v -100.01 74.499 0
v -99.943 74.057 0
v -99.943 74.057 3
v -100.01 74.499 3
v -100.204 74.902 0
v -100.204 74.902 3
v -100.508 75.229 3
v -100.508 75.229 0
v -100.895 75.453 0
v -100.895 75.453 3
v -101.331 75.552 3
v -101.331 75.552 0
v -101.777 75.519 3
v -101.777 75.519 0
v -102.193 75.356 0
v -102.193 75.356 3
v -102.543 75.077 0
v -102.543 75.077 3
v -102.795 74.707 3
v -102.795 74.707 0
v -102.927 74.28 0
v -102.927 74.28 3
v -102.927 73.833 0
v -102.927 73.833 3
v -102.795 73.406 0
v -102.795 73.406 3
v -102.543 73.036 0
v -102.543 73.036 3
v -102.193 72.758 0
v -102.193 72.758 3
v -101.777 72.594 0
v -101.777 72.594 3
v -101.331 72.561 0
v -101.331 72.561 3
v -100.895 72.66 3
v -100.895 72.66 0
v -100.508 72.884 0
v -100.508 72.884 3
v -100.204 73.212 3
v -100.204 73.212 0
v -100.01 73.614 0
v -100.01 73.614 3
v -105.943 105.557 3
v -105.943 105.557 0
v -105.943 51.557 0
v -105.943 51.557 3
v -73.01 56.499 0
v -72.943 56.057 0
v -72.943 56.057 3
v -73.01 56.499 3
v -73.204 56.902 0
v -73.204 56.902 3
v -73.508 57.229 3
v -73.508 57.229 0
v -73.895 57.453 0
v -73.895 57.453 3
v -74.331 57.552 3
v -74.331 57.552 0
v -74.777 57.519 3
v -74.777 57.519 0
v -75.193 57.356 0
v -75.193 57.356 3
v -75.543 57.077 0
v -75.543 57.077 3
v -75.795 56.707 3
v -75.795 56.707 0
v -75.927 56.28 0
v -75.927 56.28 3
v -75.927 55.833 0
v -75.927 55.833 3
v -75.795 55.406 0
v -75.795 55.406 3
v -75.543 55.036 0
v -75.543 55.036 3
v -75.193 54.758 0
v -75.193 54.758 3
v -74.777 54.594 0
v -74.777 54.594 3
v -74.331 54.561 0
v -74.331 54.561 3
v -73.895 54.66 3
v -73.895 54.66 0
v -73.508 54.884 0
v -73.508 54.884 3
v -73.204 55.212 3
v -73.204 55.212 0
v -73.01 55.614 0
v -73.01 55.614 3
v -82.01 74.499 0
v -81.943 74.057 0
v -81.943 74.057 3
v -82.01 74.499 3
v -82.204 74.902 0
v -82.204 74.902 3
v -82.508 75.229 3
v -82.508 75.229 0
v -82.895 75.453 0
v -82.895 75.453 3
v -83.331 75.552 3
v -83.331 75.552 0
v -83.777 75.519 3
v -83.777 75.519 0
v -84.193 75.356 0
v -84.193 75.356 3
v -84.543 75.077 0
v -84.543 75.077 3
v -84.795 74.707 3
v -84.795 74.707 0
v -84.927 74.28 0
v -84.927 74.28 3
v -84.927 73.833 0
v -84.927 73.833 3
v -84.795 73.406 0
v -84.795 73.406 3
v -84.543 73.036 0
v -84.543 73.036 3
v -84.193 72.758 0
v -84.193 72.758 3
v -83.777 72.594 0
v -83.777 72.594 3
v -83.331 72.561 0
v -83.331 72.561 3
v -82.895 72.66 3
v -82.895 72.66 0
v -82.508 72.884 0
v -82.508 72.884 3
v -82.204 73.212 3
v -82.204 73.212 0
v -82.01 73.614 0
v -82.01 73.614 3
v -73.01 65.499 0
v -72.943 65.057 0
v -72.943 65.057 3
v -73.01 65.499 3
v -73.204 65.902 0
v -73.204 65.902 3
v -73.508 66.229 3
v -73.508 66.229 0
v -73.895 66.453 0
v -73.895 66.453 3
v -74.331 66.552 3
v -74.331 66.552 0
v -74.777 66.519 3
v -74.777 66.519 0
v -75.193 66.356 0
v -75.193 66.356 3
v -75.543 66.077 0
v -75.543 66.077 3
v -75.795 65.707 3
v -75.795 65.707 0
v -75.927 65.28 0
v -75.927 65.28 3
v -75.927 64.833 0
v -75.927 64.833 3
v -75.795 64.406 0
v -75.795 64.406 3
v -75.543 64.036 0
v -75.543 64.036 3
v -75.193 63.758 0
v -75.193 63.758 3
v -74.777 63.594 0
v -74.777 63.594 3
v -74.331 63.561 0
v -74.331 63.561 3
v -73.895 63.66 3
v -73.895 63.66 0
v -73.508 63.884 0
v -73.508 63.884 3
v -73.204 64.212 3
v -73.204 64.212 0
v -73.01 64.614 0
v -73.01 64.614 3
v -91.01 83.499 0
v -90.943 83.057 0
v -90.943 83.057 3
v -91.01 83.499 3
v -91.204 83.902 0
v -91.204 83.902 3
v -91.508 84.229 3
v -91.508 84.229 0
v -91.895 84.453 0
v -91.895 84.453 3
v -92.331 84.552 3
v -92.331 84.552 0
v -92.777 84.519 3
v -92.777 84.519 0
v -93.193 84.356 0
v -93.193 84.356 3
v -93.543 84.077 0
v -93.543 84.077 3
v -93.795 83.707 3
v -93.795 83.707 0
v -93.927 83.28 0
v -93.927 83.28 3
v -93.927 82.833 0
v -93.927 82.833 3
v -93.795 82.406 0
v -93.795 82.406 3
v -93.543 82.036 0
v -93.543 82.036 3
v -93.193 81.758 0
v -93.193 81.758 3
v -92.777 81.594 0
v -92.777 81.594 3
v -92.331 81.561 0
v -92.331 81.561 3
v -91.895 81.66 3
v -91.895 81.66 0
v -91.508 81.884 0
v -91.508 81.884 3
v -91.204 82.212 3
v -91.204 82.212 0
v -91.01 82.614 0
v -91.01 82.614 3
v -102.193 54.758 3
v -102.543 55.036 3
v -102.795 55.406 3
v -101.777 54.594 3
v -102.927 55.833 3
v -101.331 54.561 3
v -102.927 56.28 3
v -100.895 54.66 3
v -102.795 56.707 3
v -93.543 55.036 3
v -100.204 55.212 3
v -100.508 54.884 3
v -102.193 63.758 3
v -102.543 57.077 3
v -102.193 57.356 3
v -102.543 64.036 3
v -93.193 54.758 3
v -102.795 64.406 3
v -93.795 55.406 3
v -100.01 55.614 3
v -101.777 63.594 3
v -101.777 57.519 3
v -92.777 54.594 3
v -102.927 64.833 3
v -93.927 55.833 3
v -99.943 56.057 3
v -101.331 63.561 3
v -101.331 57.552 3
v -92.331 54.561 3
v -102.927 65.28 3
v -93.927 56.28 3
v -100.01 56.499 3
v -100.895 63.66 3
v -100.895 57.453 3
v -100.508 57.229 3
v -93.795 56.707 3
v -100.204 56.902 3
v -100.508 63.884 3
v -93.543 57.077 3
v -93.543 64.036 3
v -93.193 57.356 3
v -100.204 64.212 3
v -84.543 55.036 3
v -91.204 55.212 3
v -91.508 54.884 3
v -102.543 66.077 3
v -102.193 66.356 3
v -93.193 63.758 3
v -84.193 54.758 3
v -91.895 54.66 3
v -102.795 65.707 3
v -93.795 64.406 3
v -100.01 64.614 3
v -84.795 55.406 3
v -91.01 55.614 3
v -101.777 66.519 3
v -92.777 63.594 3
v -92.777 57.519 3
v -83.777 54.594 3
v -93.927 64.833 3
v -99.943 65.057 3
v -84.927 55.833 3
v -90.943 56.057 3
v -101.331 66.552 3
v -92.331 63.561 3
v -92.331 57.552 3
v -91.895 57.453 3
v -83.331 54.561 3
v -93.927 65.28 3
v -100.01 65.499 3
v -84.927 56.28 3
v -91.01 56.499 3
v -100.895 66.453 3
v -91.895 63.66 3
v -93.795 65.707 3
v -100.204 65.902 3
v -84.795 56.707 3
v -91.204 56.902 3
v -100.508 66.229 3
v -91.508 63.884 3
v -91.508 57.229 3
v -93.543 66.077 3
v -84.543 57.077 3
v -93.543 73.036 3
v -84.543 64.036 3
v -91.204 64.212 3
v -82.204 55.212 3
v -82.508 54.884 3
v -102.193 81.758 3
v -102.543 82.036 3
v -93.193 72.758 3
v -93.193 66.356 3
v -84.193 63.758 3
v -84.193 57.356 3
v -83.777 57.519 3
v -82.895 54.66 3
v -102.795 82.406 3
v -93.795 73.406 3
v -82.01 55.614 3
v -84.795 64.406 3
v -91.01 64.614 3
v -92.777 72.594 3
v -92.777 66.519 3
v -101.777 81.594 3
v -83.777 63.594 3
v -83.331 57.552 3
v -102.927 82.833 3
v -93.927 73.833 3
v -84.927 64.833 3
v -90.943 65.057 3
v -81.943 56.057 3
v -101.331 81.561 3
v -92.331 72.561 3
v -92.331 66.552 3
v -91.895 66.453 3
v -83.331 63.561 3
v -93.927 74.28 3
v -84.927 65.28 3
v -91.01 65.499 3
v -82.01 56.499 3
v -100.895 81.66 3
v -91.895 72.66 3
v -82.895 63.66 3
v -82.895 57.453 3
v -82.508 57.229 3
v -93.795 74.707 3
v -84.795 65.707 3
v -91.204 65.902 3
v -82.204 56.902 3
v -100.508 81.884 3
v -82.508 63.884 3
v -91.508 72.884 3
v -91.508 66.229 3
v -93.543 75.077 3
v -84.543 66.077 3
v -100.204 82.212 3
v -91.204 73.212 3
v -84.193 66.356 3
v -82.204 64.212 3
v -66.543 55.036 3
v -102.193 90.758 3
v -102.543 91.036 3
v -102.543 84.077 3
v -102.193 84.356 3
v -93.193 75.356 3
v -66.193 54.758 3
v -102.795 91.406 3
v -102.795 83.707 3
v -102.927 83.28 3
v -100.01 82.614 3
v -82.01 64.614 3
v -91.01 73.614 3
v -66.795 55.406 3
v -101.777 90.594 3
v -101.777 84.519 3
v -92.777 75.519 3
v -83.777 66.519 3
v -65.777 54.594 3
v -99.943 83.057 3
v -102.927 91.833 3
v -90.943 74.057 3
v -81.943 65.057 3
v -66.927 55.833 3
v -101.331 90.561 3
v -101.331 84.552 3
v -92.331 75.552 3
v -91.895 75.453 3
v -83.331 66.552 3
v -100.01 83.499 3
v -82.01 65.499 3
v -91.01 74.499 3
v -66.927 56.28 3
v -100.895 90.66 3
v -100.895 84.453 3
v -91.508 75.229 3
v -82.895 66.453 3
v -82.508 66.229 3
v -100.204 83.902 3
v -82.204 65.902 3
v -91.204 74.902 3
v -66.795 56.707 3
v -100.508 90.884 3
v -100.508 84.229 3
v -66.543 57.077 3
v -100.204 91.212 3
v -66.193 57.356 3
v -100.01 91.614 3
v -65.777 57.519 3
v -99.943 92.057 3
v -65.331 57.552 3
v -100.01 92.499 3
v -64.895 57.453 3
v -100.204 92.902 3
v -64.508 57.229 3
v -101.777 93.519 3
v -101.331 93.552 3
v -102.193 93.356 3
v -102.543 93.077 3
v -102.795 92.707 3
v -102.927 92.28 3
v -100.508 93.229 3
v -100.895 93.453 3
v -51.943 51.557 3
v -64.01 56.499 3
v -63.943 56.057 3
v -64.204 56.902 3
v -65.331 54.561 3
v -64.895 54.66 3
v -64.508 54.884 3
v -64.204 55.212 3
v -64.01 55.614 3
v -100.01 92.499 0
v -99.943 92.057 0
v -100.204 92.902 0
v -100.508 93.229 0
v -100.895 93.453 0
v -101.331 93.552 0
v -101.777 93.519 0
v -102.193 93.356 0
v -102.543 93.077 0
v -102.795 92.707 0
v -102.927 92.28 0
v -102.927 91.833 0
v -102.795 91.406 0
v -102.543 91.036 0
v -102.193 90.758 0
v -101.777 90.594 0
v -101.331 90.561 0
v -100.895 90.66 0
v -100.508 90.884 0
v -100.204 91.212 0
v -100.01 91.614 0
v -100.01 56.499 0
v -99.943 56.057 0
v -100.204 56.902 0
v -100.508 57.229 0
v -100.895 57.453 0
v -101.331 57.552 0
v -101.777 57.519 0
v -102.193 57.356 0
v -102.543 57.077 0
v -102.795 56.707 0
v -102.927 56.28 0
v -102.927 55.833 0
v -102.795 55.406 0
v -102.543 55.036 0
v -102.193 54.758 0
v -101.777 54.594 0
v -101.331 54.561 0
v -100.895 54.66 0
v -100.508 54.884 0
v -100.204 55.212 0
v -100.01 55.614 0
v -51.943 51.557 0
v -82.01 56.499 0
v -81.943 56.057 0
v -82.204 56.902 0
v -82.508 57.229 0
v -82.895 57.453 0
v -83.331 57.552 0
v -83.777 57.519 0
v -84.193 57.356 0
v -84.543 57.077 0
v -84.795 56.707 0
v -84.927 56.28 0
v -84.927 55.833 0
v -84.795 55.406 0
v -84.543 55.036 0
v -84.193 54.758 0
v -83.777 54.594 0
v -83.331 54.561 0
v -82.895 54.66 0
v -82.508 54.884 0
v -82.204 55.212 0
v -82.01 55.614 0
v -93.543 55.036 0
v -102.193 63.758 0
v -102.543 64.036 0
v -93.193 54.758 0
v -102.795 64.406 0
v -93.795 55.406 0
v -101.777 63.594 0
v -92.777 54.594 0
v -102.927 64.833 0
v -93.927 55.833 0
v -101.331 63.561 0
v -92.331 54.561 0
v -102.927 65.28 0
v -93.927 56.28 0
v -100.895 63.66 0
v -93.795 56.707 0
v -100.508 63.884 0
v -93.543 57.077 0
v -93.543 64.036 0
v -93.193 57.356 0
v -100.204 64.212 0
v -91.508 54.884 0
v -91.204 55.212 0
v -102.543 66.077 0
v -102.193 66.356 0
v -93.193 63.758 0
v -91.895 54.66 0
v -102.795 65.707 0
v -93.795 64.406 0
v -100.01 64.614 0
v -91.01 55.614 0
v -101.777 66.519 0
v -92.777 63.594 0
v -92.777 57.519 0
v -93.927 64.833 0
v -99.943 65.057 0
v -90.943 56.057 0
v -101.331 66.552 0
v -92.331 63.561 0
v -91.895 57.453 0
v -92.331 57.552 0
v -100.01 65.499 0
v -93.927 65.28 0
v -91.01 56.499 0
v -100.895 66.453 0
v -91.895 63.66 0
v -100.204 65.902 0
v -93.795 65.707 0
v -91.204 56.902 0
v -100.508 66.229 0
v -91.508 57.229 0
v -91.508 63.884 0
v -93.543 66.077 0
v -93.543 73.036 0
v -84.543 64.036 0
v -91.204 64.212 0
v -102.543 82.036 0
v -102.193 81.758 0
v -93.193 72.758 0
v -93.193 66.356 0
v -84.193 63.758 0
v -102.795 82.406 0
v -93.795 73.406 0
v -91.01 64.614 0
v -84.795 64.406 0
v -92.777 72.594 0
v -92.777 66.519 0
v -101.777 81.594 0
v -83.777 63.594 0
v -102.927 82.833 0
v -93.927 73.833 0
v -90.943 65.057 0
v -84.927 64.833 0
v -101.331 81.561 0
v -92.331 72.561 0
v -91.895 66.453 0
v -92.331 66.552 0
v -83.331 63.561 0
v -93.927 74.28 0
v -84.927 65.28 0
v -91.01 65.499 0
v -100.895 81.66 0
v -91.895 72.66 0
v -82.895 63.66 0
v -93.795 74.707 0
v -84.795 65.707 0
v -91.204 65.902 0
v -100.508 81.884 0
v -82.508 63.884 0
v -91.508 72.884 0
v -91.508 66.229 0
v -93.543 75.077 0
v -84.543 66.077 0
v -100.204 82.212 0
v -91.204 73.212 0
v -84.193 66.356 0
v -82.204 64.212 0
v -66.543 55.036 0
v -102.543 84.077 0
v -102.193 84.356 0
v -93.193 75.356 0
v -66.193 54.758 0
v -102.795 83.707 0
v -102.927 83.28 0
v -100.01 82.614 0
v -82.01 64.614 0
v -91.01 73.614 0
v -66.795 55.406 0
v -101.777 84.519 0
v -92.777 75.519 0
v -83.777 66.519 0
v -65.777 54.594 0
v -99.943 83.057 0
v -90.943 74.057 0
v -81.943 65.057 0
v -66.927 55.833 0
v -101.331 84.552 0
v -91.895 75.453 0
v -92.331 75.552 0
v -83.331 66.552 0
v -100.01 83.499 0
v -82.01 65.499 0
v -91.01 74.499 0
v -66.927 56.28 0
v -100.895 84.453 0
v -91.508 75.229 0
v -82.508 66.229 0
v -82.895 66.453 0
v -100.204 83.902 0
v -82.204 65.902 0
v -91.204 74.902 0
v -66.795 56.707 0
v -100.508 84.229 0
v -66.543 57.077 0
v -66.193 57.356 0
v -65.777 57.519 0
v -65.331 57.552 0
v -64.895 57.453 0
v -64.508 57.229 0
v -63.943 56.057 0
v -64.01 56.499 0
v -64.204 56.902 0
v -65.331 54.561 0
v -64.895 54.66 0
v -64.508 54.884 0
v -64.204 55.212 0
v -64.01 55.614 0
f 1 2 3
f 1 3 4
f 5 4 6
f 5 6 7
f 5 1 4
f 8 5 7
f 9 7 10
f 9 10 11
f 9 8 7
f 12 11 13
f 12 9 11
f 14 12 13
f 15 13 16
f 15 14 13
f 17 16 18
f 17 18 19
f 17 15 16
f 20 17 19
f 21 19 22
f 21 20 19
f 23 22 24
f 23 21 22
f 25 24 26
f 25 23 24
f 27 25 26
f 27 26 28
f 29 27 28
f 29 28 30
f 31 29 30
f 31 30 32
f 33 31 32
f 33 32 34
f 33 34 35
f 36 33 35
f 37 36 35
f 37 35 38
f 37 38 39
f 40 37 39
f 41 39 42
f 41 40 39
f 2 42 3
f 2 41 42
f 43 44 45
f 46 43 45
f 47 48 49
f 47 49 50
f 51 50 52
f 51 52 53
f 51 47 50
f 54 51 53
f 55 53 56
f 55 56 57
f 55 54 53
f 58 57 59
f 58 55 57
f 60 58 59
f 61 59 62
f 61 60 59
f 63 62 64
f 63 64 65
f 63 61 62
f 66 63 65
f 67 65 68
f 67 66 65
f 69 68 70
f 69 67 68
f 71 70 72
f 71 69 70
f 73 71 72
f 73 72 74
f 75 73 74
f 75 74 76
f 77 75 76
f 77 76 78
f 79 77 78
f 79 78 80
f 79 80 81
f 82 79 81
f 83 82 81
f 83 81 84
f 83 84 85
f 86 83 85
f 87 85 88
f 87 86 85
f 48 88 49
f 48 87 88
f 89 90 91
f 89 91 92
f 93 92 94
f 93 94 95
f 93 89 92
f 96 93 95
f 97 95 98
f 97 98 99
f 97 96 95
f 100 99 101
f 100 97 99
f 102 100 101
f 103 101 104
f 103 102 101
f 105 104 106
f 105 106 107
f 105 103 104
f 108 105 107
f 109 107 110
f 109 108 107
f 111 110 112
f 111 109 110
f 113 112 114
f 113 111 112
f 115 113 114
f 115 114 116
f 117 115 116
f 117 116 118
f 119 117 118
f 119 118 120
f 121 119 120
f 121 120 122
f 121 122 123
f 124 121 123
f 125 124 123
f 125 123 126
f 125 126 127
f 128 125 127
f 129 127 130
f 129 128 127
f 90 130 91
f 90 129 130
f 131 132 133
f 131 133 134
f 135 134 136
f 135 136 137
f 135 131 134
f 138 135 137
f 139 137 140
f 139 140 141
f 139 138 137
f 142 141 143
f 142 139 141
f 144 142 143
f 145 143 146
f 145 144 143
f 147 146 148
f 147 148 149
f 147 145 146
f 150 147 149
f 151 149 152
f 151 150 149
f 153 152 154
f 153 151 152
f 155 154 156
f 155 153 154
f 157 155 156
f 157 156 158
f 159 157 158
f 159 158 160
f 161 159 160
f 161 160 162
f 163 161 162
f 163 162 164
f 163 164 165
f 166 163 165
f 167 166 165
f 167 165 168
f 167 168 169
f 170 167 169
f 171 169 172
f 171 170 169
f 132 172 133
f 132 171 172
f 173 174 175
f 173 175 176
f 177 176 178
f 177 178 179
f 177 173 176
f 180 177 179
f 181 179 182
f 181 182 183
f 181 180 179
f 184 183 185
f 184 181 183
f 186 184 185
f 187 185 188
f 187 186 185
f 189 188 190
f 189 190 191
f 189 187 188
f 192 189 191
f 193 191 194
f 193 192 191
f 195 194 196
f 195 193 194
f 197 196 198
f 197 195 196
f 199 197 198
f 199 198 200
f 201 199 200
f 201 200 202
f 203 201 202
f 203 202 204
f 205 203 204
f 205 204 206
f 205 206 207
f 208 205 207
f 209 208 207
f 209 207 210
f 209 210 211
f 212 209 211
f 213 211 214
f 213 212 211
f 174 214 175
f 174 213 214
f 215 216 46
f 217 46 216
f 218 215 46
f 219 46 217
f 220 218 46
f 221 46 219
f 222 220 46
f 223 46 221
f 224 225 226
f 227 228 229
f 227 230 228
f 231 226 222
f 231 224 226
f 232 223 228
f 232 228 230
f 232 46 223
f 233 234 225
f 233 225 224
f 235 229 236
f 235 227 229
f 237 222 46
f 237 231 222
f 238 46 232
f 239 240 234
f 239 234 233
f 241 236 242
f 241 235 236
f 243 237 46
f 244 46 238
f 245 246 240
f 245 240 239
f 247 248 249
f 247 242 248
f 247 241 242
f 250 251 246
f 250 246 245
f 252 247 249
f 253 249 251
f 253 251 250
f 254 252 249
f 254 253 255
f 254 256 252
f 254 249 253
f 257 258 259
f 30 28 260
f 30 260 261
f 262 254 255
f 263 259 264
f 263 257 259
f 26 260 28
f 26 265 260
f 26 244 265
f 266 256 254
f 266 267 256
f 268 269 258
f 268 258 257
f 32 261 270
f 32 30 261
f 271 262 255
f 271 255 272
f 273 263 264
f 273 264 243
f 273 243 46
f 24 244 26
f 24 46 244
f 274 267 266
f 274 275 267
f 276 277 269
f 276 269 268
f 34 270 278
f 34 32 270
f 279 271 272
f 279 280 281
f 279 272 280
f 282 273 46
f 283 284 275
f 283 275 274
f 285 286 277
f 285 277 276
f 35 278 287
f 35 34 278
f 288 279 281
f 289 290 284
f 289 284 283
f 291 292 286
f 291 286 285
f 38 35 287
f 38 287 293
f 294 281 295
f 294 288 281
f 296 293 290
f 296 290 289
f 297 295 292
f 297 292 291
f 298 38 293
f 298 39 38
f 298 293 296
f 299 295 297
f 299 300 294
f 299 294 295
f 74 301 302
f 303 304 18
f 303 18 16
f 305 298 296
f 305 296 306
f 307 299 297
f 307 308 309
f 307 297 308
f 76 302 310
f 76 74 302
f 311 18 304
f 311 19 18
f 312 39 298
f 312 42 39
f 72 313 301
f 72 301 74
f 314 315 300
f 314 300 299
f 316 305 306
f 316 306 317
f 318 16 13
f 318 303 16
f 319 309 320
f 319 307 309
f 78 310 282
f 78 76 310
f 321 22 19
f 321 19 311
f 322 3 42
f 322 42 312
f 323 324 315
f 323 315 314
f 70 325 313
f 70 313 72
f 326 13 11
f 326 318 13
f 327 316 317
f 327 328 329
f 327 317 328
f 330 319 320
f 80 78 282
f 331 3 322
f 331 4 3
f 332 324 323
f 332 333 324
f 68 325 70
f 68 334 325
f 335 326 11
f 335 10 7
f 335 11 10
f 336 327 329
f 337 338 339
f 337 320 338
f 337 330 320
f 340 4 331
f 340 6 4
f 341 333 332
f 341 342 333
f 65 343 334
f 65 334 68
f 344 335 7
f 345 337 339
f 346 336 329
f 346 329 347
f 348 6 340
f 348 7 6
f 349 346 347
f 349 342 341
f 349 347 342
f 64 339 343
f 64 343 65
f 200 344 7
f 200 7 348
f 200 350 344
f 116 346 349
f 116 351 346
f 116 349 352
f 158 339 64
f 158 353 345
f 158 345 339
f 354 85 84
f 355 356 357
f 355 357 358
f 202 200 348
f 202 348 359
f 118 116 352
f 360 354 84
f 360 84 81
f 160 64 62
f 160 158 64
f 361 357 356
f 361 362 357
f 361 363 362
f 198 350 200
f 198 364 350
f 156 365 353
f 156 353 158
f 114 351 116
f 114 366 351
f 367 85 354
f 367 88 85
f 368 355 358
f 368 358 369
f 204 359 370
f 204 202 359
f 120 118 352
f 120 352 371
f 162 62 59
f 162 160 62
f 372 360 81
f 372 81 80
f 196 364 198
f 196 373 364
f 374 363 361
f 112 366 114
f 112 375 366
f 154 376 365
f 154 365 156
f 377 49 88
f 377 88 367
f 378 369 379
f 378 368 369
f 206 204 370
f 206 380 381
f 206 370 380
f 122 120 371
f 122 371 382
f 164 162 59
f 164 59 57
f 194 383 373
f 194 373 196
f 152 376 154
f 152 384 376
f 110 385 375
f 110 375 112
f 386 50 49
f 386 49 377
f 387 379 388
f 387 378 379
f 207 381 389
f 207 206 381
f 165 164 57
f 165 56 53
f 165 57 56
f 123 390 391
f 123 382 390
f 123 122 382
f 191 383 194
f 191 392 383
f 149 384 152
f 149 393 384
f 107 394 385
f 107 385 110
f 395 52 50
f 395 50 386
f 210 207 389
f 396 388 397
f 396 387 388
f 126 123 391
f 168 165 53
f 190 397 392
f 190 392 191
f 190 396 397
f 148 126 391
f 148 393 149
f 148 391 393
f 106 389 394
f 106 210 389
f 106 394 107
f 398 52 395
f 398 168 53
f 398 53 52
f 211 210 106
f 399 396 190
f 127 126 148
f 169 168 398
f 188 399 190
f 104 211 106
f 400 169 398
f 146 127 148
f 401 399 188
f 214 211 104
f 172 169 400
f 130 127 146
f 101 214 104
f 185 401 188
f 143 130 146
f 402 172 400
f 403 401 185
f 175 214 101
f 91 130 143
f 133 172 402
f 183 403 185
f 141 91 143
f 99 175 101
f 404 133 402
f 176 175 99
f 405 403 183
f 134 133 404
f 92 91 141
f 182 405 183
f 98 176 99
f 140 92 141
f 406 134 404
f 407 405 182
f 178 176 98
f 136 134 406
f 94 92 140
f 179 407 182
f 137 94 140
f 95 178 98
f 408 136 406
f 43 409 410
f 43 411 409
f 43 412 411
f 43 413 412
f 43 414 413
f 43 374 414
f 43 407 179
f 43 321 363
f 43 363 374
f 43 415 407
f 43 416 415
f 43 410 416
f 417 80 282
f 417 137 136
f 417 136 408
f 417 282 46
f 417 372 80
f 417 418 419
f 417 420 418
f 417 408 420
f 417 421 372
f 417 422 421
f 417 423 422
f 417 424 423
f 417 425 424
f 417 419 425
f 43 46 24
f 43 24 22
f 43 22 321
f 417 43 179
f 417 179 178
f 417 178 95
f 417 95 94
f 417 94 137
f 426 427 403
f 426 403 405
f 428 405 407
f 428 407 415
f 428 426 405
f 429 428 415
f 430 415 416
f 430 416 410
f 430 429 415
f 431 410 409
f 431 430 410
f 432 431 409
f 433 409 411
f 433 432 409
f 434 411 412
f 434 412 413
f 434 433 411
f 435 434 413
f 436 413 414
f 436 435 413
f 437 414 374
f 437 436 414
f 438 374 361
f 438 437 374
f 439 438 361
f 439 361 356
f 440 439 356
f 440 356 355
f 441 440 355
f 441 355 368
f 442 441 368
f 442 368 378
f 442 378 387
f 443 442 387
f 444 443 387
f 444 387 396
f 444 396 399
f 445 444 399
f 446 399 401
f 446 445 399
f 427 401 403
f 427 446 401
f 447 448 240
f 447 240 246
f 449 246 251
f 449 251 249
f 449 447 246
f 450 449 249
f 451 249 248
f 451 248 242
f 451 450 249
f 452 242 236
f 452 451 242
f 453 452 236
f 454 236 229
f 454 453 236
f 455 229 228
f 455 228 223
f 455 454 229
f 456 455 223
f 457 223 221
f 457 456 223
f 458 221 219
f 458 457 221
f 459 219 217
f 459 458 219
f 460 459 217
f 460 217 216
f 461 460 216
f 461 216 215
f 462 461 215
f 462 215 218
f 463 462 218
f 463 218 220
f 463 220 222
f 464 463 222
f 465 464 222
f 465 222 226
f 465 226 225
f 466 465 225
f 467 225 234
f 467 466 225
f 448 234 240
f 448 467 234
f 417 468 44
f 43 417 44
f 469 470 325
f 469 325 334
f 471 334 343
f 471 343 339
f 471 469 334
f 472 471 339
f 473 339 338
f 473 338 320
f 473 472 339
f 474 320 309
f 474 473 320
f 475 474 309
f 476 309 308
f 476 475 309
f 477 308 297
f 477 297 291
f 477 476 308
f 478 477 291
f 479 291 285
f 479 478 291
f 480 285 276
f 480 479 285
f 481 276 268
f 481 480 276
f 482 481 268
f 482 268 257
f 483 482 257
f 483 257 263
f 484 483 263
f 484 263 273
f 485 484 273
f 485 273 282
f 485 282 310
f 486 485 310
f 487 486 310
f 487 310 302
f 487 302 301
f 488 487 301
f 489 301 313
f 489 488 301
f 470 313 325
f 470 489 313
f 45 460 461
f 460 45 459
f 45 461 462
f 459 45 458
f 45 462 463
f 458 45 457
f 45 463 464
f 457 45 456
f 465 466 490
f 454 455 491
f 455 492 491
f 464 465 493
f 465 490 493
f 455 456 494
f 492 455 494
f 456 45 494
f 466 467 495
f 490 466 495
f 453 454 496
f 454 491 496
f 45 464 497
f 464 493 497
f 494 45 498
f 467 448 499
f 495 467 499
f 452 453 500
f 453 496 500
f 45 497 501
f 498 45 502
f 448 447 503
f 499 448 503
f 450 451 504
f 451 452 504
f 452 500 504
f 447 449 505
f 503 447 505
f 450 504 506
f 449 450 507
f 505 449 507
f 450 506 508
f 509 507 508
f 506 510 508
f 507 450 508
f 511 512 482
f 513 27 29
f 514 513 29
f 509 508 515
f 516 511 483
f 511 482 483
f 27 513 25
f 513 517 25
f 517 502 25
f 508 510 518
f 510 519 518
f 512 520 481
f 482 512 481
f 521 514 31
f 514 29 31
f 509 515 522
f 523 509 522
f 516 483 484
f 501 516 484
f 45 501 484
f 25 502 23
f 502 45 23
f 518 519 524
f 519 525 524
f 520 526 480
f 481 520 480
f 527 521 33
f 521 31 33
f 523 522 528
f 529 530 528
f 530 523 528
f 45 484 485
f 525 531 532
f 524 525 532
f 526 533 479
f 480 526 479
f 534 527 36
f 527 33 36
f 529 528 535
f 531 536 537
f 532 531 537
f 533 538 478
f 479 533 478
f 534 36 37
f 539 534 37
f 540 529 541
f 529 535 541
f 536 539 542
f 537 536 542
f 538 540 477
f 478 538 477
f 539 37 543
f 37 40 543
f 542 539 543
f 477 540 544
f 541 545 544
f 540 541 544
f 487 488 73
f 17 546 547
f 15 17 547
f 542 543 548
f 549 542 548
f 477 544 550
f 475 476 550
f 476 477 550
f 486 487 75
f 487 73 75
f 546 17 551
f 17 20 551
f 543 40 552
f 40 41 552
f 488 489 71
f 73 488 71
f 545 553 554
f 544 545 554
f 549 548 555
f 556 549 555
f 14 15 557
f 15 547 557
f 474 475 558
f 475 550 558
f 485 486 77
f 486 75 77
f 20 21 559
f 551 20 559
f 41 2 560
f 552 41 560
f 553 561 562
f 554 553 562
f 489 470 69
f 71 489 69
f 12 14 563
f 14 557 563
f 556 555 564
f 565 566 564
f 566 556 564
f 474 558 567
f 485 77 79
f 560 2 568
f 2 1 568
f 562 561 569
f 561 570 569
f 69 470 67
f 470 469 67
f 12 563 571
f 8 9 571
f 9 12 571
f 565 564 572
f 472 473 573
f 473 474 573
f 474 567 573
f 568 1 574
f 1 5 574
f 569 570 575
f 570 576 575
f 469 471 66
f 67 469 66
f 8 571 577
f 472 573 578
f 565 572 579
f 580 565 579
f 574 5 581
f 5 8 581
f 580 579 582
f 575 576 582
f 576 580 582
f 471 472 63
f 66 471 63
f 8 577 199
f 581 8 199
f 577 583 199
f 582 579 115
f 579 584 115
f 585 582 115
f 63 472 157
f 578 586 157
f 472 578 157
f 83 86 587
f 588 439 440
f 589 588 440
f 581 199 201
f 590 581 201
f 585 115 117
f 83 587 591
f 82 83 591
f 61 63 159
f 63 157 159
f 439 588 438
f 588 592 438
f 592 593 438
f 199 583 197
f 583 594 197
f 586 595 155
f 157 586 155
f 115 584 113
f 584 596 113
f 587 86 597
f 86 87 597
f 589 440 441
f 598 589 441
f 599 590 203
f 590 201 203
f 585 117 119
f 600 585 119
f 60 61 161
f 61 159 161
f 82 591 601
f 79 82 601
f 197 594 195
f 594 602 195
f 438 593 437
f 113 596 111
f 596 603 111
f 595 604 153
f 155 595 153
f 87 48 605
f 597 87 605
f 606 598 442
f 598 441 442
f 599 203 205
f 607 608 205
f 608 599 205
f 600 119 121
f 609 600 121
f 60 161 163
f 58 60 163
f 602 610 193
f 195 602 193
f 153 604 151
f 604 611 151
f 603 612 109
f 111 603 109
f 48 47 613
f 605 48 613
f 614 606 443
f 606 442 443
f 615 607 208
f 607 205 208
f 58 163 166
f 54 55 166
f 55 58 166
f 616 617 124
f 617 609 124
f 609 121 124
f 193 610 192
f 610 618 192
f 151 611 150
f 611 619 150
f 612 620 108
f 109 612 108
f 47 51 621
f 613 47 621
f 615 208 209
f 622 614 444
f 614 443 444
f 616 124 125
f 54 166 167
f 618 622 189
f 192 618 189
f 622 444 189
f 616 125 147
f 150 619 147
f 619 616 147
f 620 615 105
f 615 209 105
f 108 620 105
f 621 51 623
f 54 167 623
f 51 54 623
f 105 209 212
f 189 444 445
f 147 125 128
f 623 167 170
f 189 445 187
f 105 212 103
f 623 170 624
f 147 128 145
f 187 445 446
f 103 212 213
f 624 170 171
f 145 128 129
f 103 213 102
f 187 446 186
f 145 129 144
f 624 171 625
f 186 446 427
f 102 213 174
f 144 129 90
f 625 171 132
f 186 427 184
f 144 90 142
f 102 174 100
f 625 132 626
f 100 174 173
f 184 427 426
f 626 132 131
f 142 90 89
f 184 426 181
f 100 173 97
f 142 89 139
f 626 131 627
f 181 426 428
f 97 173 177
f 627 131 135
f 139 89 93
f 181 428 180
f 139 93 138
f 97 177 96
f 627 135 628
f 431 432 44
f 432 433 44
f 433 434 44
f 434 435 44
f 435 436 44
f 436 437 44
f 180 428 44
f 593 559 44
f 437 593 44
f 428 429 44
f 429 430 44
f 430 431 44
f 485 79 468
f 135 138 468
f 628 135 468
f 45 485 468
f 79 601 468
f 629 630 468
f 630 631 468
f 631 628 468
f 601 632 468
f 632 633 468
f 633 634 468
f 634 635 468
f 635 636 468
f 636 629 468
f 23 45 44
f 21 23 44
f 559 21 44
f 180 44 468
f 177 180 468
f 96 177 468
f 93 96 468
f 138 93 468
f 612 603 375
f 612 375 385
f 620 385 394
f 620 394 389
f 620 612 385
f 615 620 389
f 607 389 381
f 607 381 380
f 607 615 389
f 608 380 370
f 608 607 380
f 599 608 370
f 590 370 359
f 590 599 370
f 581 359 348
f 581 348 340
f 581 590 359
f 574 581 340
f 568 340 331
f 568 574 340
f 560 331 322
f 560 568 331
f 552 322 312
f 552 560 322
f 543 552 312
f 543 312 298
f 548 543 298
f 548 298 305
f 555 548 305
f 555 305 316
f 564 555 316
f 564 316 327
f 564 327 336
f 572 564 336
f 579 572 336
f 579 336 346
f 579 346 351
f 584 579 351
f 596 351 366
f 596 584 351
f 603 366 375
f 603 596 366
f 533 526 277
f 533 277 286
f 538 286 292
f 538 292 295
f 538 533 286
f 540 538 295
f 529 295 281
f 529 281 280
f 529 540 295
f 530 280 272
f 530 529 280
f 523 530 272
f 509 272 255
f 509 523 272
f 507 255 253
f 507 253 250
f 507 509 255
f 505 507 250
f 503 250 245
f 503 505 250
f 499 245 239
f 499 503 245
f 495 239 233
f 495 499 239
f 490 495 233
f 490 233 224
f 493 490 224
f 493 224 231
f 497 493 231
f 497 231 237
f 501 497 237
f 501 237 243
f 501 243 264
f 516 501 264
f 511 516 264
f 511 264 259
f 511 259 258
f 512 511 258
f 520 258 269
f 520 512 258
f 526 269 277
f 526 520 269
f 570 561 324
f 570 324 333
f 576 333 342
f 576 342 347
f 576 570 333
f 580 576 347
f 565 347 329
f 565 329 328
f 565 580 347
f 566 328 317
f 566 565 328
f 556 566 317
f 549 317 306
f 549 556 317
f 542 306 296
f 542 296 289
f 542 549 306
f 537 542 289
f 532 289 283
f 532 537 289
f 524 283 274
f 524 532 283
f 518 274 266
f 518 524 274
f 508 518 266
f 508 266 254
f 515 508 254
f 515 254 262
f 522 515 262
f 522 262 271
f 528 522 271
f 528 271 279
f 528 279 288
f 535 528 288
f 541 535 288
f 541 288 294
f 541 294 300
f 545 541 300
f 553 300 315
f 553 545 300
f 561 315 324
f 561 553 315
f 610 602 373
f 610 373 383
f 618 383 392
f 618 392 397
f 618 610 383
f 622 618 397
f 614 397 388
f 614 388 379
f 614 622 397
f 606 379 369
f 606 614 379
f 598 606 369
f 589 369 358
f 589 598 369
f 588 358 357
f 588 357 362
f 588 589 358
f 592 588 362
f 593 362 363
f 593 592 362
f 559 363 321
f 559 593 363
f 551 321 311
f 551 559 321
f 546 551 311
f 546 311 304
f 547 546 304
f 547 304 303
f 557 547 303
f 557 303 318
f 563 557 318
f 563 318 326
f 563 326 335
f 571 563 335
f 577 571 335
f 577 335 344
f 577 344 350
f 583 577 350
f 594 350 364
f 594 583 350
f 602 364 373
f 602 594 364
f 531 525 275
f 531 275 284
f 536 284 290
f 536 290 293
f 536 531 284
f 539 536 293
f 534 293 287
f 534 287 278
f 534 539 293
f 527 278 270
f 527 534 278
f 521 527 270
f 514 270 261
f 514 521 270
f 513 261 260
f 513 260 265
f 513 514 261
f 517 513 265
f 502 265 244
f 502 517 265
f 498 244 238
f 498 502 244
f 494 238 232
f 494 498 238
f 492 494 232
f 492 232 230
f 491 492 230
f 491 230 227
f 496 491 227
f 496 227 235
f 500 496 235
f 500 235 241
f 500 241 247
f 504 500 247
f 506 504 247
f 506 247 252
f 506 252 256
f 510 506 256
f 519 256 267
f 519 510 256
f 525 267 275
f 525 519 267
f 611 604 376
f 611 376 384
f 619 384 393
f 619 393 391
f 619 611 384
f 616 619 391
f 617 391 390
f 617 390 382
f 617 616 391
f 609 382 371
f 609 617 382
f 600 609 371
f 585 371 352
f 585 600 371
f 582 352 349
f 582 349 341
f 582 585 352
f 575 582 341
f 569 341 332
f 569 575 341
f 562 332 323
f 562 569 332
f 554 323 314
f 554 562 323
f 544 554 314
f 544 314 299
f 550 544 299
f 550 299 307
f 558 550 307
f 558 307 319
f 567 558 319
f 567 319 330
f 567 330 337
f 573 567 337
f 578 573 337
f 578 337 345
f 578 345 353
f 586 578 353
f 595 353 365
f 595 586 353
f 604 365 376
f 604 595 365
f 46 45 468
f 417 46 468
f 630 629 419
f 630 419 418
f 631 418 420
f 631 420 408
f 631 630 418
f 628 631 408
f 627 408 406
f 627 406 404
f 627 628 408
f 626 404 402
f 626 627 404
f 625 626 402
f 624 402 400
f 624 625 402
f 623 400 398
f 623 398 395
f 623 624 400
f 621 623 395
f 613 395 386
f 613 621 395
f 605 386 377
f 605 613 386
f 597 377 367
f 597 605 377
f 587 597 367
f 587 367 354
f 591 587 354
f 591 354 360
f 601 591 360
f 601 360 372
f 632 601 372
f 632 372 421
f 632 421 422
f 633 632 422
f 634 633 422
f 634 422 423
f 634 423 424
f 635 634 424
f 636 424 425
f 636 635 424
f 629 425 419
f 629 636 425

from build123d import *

# Parameters (mm, degrees)
MODEL_R                 = 1.5
SALIENTE_EXTRUIR1_DEPTH = 3


with BuildPart() as part:
    # Model → Saliente-Extruir1 (new body)
    with BuildSketch(Plane.XY):
        Polygon((-105.943383637, 105.556539338), (-105.943383637, 51.556539338), (-51.943383637, 51.556539338), align=None)
        with Locations((-101.443383637, 92.056539338)):
            Circle(MODEL_R, mode=Mode.SUBTRACT)
        with Locations((-101.443383637, 83.056539338)):
            Circle(MODEL_R, mode=Mode.SUBTRACT)
        with Locations((-92.443383637, 83.056539338)):
            Circle(MODEL_R, mode=Mode.SUBTRACT)
        with Locations((-101.443383637, 74.056539338)):
            Circle(MODEL_R, mode=Mode.SUBTRACT)
        with Locations((-92.443383637, 74.056539338)):
            Circle(MODEL_R, mode=Mode.SUBTRACT)
        with Locations((-83.443383637, 74.056539338)):
            Circle(MODEL_R, mode=Mode.SUBTRACT)
        with Locations((-101.443383637, 65.056539338)):
            Circle(MODEL_R, mode=Mode.SUBTRACT)
        with Locations((-92.443383637, 65.056539338)):
            Circle(MODEL_R, mode=Mode.SUBTRACT)
        with Locations((-83.443383637, 65.056539338)):
            Circle(MODEL_R, mode=Mode.SUBTRACT)
        with Locations((-74.443383637, 65.056539338)):
            Circle(MODEL_R, mode=Mode.SUBTRACT)
        with Locations((-101.443383637, 56.056539338)):
            Circle(MODEL_R, mode=Mode.SUBTRACT)
        with Locations((-92.443383637, 56.056539338)):
            Circle(MODEL_R, mode=Mode.SUBTRACT)
        with Locations((-83.443383637, 56.056539338)):
            Circle(MODEL_R, mode=Mode.SUBTRACT)
        with Locations((-74.443383637, 56.056539338)):
            Circle(MODEL_R, mode=Mode.SUBTRACT)
        with Locations((-65.443383637, 56.056539338)):
            Circle(MODEL_R, mode=Mode.SUBTRACT)
    extrude(amount=SALIENTE_EXTRUIR1_DEPTH)


solid = part.part
